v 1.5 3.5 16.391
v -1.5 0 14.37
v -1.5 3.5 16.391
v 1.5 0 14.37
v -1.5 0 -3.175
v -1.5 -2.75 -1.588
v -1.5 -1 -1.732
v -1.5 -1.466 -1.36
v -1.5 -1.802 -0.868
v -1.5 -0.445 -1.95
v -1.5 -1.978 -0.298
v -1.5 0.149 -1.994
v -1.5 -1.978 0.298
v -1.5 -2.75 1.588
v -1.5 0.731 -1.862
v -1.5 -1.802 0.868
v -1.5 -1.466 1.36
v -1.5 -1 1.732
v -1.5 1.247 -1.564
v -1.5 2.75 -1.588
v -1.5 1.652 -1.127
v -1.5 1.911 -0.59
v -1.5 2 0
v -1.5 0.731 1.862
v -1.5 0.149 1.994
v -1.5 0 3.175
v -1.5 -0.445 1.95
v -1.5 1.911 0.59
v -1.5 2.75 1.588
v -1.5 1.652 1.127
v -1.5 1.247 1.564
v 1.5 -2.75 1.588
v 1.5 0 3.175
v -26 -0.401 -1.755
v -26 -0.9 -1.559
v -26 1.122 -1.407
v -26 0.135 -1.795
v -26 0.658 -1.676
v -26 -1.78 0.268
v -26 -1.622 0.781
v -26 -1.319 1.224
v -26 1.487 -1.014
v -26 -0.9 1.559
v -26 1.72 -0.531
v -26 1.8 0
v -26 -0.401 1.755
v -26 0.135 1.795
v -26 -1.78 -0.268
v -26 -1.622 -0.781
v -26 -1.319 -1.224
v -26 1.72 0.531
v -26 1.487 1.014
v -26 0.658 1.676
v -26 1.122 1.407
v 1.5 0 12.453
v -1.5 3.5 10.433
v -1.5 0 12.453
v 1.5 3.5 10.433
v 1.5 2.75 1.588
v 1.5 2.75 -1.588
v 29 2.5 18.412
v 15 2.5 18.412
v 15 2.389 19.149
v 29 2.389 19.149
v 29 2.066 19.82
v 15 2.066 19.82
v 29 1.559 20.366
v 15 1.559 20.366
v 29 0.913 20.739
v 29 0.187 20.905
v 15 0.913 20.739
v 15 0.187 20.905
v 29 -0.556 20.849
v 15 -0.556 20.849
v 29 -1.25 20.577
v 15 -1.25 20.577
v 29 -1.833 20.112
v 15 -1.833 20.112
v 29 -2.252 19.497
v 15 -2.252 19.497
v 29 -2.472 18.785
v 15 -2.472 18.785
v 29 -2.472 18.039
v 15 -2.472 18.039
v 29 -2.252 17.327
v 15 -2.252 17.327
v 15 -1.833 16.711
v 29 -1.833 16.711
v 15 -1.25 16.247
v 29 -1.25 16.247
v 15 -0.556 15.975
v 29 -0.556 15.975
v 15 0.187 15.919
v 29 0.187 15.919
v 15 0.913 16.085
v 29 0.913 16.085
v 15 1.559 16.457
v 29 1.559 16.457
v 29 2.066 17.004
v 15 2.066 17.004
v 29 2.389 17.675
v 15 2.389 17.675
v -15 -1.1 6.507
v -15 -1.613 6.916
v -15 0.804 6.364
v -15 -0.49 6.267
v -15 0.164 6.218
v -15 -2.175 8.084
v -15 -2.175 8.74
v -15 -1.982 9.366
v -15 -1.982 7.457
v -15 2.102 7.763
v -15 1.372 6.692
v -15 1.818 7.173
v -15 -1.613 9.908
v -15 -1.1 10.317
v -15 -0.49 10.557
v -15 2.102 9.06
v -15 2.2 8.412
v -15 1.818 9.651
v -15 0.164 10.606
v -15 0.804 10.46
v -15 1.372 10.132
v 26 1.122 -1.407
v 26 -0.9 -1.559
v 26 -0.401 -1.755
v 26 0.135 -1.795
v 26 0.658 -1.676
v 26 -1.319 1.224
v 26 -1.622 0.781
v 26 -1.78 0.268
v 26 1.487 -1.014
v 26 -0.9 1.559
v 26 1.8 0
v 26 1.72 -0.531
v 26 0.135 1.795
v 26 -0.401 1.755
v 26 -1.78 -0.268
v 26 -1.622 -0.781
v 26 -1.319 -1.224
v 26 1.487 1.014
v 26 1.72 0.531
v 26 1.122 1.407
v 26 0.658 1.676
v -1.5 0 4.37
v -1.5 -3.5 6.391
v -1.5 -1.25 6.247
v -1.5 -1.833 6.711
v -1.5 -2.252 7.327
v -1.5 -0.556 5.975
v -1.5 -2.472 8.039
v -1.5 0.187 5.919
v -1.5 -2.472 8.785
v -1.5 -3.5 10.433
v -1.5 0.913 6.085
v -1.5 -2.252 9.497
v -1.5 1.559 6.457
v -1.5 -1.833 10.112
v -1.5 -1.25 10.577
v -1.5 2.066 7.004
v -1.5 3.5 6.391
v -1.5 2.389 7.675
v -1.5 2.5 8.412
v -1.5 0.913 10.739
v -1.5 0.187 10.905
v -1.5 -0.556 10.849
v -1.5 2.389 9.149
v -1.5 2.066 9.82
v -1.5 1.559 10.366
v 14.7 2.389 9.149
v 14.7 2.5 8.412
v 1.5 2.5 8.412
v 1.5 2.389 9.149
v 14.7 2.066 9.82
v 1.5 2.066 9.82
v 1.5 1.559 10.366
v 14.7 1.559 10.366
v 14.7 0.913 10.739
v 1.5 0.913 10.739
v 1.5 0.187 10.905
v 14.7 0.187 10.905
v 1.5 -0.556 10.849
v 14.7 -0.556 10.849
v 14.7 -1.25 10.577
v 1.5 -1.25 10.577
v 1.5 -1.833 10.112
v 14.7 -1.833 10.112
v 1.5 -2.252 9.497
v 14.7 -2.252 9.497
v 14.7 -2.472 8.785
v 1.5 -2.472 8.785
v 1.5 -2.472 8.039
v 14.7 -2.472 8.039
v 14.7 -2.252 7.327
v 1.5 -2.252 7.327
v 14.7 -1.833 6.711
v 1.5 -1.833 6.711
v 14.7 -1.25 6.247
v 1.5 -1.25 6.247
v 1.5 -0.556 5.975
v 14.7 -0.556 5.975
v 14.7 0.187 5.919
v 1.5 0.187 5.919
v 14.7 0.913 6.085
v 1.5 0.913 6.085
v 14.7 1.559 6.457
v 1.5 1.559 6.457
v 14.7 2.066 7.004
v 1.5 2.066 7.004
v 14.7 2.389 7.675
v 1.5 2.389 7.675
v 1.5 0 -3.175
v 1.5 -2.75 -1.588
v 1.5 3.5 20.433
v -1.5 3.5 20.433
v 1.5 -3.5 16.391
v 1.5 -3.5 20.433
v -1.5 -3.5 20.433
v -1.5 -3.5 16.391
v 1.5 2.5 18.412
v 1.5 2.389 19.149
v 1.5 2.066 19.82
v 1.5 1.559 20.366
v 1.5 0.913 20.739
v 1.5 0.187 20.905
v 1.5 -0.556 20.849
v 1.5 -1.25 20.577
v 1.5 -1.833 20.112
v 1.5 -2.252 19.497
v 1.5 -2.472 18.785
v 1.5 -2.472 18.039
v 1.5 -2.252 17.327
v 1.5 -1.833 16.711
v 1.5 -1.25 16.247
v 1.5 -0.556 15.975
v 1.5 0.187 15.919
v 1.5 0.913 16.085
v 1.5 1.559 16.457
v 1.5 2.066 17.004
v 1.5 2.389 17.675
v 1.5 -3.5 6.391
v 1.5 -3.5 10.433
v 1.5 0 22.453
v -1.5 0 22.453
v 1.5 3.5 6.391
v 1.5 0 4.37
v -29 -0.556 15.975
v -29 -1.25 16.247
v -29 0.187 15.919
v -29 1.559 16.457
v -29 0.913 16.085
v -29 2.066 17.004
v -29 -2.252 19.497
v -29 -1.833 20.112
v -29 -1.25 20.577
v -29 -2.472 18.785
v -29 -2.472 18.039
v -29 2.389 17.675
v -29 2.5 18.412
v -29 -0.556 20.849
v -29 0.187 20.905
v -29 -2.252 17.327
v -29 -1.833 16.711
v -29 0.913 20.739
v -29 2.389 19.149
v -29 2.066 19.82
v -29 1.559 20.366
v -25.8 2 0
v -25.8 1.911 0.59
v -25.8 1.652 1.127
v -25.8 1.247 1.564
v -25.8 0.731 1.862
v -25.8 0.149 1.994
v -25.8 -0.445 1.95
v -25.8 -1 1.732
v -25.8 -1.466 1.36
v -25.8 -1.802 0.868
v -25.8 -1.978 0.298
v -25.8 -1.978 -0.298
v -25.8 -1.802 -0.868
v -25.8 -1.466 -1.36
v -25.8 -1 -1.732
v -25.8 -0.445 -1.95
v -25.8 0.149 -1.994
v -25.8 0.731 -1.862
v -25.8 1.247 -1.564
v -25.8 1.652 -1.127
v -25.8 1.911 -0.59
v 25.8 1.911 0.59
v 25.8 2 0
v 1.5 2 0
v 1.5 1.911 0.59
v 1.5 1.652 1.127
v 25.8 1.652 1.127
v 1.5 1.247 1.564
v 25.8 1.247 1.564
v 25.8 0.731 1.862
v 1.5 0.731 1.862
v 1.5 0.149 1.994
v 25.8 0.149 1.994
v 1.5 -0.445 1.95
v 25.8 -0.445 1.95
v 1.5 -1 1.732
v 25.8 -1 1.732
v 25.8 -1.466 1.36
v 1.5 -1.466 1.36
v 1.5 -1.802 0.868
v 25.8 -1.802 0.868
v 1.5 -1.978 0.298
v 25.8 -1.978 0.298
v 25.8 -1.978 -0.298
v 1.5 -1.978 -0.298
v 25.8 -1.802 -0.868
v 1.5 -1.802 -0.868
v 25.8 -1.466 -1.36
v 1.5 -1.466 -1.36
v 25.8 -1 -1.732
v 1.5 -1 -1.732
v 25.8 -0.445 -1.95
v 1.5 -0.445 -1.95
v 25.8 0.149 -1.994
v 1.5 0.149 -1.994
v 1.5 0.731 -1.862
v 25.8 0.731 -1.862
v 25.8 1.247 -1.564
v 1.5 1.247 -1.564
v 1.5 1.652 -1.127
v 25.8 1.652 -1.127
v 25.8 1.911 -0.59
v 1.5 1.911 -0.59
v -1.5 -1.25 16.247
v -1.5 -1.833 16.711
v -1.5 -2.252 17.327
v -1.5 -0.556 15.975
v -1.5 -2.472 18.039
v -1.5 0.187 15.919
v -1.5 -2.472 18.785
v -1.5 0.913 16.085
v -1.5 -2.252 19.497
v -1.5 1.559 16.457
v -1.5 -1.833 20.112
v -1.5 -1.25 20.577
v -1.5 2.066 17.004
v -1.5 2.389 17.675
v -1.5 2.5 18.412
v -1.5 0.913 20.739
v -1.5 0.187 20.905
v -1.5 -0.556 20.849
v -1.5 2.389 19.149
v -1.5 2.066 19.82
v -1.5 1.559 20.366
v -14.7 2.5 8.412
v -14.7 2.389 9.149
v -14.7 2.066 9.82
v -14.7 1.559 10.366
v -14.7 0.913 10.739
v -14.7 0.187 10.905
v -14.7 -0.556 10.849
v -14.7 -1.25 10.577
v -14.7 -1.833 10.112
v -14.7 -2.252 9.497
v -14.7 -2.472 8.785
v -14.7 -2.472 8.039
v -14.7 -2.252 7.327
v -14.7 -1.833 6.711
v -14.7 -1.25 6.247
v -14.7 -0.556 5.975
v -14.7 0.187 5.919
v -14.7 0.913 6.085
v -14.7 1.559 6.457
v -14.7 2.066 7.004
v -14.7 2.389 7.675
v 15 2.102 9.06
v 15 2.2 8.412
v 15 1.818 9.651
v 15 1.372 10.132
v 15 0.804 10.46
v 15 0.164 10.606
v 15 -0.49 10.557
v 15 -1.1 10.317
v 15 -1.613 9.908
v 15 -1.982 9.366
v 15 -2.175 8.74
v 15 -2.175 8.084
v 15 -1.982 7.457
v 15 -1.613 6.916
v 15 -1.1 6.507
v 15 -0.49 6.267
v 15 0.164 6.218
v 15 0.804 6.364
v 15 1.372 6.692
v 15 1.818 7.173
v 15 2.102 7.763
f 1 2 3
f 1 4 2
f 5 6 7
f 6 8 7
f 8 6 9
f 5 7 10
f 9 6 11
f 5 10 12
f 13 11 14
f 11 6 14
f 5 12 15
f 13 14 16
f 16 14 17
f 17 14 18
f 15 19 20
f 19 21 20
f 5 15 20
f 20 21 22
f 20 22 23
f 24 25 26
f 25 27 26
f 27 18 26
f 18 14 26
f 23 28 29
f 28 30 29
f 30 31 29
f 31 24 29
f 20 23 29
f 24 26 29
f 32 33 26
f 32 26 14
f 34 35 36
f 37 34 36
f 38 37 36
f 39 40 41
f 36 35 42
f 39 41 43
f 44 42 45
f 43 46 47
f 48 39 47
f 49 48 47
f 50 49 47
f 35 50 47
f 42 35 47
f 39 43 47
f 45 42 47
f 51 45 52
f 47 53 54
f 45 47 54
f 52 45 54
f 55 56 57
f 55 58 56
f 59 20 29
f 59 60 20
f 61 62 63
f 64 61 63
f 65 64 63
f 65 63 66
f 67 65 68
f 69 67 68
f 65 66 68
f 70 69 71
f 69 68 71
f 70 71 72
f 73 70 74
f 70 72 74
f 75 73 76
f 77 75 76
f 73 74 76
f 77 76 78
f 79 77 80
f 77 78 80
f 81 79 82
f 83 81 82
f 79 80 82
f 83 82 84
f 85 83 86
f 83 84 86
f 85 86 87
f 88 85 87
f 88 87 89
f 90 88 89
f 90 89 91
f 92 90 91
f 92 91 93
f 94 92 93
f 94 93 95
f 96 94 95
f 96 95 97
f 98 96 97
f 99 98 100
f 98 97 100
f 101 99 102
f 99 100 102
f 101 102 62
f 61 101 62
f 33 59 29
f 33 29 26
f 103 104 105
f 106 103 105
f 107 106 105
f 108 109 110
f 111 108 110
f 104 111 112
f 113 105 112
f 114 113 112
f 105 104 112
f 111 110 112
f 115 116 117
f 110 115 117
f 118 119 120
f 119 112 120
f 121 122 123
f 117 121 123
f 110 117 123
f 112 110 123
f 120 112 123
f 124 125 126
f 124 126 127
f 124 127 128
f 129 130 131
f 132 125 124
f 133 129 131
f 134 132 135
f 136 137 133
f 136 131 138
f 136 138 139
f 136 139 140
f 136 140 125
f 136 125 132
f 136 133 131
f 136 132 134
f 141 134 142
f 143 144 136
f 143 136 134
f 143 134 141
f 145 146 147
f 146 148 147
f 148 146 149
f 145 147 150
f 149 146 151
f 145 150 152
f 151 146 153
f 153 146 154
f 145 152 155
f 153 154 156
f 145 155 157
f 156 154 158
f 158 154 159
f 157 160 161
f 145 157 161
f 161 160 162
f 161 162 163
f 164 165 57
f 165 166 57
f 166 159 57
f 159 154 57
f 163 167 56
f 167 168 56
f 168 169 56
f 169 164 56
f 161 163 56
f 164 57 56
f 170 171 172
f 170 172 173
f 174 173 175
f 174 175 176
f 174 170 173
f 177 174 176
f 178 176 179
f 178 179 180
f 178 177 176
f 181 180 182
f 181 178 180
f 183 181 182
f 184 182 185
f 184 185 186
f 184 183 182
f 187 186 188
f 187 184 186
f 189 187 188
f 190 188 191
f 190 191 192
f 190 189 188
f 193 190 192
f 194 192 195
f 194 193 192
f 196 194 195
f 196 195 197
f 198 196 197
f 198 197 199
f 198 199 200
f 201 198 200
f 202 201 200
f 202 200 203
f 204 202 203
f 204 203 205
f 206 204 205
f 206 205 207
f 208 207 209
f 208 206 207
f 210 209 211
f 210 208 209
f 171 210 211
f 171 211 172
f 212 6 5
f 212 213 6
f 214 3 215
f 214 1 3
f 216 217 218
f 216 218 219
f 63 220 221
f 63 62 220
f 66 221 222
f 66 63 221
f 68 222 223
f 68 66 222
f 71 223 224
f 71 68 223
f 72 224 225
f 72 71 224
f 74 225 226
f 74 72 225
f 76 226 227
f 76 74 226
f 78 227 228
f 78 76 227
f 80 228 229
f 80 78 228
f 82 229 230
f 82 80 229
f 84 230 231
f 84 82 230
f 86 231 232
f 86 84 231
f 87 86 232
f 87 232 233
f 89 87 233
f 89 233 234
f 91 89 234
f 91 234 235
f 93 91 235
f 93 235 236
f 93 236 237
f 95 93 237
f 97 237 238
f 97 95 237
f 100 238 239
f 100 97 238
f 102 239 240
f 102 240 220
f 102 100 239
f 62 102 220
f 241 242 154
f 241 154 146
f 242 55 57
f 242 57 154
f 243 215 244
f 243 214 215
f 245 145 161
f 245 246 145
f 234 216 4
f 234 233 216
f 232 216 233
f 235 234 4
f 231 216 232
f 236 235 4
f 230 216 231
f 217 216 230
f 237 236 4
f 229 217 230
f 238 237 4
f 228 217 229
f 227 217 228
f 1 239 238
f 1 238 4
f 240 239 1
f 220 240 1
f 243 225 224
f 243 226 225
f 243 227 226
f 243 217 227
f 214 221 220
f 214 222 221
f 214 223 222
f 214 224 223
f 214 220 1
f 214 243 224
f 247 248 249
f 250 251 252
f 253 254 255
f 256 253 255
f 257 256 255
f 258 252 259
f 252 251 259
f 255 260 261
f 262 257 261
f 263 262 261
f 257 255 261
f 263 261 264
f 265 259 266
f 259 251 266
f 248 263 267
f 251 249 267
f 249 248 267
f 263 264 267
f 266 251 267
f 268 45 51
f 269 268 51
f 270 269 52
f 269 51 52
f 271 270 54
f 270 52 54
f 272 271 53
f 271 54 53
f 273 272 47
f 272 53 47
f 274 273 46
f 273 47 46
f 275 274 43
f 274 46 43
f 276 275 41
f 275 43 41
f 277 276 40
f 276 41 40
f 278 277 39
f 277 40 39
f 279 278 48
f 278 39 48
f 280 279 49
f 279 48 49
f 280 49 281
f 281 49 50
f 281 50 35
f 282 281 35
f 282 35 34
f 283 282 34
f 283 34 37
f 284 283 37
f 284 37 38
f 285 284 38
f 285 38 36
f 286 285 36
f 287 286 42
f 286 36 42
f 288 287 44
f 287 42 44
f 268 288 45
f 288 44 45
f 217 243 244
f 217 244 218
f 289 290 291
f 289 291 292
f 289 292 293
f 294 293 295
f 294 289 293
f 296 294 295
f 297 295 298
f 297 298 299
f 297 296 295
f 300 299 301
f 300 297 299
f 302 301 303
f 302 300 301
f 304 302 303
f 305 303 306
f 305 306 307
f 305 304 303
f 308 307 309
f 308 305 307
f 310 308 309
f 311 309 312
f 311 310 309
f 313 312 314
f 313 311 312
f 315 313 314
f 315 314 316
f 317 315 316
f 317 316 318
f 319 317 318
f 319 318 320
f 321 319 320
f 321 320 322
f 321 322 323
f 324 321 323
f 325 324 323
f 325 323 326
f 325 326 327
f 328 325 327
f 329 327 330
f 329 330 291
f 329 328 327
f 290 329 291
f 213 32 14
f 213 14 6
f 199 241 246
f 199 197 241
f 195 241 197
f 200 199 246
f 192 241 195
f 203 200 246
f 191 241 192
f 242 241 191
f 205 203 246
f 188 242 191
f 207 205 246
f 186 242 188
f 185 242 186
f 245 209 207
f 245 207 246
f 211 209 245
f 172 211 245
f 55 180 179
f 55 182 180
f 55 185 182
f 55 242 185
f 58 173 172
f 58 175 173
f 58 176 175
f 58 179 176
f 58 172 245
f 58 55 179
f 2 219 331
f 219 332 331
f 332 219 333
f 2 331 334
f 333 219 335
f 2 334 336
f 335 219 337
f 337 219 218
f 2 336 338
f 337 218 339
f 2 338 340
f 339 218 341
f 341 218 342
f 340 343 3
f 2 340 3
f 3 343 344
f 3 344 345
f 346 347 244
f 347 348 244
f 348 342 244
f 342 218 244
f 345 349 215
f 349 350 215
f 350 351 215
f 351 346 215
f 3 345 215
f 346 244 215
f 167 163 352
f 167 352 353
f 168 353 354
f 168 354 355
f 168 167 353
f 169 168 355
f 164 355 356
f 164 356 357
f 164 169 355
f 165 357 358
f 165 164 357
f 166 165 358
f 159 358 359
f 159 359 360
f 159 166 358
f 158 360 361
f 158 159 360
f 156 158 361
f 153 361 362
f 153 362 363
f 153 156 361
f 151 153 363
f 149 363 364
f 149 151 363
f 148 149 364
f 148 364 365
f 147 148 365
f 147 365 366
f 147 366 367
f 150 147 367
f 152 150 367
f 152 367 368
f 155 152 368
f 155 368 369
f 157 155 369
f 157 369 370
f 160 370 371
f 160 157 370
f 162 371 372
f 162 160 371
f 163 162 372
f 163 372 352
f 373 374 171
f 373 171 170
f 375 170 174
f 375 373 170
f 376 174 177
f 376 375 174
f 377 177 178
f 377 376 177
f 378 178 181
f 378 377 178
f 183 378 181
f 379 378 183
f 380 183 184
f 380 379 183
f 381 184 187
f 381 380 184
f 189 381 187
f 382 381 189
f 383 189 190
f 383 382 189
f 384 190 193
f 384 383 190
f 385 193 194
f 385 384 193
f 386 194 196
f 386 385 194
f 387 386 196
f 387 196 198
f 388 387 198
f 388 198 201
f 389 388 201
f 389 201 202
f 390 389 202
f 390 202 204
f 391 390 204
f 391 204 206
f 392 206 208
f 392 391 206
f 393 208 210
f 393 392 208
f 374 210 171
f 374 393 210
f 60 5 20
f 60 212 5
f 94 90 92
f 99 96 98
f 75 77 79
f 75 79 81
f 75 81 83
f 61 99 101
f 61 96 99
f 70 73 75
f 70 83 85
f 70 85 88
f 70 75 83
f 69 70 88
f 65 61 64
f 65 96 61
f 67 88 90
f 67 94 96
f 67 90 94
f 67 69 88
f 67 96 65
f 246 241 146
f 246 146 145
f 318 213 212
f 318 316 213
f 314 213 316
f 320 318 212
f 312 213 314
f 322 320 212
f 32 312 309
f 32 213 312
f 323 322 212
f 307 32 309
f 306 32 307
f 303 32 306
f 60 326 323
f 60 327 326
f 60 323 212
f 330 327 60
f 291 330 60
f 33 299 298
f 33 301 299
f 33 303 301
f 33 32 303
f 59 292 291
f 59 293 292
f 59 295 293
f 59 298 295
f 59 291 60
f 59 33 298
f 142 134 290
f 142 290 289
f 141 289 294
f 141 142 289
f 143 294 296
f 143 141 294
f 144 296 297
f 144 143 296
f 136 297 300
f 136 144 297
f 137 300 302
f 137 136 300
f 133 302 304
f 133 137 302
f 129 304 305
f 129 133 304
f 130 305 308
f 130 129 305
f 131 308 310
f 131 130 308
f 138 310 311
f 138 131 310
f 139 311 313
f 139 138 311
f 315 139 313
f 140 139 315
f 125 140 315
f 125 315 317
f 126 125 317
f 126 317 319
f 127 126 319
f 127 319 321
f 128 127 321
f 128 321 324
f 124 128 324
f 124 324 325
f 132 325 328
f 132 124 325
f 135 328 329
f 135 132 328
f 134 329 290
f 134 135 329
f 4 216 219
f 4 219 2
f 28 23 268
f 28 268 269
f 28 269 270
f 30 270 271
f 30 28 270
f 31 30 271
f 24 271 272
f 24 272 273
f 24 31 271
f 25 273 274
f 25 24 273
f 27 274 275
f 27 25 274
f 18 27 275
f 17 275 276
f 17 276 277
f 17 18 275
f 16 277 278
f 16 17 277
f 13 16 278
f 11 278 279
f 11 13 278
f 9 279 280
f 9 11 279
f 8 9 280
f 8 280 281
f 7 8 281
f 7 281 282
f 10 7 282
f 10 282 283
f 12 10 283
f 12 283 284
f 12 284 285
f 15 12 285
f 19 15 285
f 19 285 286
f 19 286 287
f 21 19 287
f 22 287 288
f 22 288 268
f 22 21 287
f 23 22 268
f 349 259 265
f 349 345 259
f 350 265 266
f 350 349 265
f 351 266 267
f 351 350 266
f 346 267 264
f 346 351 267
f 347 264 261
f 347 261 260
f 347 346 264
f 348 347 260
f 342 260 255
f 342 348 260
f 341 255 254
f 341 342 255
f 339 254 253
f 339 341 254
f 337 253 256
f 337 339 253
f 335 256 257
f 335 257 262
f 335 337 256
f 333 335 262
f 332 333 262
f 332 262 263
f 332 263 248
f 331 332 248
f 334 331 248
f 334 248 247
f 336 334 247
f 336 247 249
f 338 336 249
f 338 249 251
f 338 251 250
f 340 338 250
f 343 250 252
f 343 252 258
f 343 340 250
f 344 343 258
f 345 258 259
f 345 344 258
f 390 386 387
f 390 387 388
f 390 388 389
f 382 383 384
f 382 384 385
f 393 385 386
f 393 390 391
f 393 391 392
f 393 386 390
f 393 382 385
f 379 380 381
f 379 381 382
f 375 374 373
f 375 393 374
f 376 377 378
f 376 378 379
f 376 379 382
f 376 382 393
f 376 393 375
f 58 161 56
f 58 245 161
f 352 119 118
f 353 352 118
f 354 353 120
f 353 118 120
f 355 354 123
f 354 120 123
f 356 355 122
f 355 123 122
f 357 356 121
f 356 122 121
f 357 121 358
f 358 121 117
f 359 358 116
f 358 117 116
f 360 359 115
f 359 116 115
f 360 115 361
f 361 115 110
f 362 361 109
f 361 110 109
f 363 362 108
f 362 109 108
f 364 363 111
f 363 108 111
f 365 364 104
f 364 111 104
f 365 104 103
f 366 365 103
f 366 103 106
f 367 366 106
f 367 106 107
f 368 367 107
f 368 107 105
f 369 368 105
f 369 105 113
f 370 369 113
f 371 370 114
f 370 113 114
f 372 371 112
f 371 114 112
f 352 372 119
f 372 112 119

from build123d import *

# Parameters (mm, degrees)
F0_R      = 2
F1_DEPTH  = 26
F3_DEPTH  = 1.5
F4_R      = 2.5
F5_DEPTH  = 15
F7_DEPTH  = 1.5
F8_SIZE   = 0.2
F10_SIZE  = 0.3
F11_DEPTH = 14
F12_DEPTH = 14


with BuildPart() as f1:
    # F0 (on Right) → F1 (new body, symmetric)
    with BuildSketch(Plane.YZ):
        Circle(F0_R)
    extrude(amount=F1_DEPTH, both=True)

    # F2 (on Right) → F3 (join, symmetric)
    with BuildSketch(Plane.YZ):
        Polygon((2.75, -1.5877132403), (2.75, 1.5877132403), (0, 3.1754264805), (-2.75, 1.5877132403), (-2.75, -1.5877132403), (0, -3.1754264805), align=None)
    extrude(amount=F3_DEPTH, both=True)

    # F8
    f8_edges = [f1.edges().sort_by_distance(p)[0] for p in [
        (26, -2, 0),
        (-26, -2, 0),
    ]]
    chamfer(f8_edges, length=F8_SIZE)


with BuildPart() as f5:
    # F4 (on Right) → F5 (new body, symmetric)
    with BuildSketch(Plane.YZ):
        with Locations((0, 8.4119113909)):
            Circle(F4_R)
    extrude(amount=F5_DEPTH, both=True)

    # F6 (on Right) → F7 (join, symmetric)
    with BuildSketch(Plane.YZ):
        Polygon((3.5, 10.4326373331), (0, 12.4533632753), (-3.5, 10.4326373331), (-3.5, 6.3911854488), (0, 4.3704595066), (3.5, 6.3911854488), align=None)
    extrude(amount=F7_DEPTH, both=True)


with BuildPart() as f9_1:
    # F9: copy of F5
    add(f5.part.moved(Location((0, 0, 10))))

    # F11 (add): a face of the model
    f11_faces = [f9_1.faces().sort_by_distance(p)[0] for p in [
        (-15, 0, 18.4119113909),
    ]]
    extrude(f11_faces, amount=F11_DEPTH)

    # F12 (add): a face of the model
    f12_faces = [f9_1.faces().sort_by_distance(p)[0] for p in [
        (15, 0, 18.4119113909),
    ]]
    extrude(f12_faces, amount=F12_DEPTH)


with BuildPart() as f5_1:
    add(f5.part)

    # F10
    f10_edges = [f5_1.edges().sort_by_distance(p)[0] for p in [
        (-15, -2.5, 8.411911),
        (15, -2.5, 8.411911),
    ]]
    chamfer(f10_edges, length=F10_SIZE)


solid = Compound([f1.part, f9_1.part, f5_1.part])
